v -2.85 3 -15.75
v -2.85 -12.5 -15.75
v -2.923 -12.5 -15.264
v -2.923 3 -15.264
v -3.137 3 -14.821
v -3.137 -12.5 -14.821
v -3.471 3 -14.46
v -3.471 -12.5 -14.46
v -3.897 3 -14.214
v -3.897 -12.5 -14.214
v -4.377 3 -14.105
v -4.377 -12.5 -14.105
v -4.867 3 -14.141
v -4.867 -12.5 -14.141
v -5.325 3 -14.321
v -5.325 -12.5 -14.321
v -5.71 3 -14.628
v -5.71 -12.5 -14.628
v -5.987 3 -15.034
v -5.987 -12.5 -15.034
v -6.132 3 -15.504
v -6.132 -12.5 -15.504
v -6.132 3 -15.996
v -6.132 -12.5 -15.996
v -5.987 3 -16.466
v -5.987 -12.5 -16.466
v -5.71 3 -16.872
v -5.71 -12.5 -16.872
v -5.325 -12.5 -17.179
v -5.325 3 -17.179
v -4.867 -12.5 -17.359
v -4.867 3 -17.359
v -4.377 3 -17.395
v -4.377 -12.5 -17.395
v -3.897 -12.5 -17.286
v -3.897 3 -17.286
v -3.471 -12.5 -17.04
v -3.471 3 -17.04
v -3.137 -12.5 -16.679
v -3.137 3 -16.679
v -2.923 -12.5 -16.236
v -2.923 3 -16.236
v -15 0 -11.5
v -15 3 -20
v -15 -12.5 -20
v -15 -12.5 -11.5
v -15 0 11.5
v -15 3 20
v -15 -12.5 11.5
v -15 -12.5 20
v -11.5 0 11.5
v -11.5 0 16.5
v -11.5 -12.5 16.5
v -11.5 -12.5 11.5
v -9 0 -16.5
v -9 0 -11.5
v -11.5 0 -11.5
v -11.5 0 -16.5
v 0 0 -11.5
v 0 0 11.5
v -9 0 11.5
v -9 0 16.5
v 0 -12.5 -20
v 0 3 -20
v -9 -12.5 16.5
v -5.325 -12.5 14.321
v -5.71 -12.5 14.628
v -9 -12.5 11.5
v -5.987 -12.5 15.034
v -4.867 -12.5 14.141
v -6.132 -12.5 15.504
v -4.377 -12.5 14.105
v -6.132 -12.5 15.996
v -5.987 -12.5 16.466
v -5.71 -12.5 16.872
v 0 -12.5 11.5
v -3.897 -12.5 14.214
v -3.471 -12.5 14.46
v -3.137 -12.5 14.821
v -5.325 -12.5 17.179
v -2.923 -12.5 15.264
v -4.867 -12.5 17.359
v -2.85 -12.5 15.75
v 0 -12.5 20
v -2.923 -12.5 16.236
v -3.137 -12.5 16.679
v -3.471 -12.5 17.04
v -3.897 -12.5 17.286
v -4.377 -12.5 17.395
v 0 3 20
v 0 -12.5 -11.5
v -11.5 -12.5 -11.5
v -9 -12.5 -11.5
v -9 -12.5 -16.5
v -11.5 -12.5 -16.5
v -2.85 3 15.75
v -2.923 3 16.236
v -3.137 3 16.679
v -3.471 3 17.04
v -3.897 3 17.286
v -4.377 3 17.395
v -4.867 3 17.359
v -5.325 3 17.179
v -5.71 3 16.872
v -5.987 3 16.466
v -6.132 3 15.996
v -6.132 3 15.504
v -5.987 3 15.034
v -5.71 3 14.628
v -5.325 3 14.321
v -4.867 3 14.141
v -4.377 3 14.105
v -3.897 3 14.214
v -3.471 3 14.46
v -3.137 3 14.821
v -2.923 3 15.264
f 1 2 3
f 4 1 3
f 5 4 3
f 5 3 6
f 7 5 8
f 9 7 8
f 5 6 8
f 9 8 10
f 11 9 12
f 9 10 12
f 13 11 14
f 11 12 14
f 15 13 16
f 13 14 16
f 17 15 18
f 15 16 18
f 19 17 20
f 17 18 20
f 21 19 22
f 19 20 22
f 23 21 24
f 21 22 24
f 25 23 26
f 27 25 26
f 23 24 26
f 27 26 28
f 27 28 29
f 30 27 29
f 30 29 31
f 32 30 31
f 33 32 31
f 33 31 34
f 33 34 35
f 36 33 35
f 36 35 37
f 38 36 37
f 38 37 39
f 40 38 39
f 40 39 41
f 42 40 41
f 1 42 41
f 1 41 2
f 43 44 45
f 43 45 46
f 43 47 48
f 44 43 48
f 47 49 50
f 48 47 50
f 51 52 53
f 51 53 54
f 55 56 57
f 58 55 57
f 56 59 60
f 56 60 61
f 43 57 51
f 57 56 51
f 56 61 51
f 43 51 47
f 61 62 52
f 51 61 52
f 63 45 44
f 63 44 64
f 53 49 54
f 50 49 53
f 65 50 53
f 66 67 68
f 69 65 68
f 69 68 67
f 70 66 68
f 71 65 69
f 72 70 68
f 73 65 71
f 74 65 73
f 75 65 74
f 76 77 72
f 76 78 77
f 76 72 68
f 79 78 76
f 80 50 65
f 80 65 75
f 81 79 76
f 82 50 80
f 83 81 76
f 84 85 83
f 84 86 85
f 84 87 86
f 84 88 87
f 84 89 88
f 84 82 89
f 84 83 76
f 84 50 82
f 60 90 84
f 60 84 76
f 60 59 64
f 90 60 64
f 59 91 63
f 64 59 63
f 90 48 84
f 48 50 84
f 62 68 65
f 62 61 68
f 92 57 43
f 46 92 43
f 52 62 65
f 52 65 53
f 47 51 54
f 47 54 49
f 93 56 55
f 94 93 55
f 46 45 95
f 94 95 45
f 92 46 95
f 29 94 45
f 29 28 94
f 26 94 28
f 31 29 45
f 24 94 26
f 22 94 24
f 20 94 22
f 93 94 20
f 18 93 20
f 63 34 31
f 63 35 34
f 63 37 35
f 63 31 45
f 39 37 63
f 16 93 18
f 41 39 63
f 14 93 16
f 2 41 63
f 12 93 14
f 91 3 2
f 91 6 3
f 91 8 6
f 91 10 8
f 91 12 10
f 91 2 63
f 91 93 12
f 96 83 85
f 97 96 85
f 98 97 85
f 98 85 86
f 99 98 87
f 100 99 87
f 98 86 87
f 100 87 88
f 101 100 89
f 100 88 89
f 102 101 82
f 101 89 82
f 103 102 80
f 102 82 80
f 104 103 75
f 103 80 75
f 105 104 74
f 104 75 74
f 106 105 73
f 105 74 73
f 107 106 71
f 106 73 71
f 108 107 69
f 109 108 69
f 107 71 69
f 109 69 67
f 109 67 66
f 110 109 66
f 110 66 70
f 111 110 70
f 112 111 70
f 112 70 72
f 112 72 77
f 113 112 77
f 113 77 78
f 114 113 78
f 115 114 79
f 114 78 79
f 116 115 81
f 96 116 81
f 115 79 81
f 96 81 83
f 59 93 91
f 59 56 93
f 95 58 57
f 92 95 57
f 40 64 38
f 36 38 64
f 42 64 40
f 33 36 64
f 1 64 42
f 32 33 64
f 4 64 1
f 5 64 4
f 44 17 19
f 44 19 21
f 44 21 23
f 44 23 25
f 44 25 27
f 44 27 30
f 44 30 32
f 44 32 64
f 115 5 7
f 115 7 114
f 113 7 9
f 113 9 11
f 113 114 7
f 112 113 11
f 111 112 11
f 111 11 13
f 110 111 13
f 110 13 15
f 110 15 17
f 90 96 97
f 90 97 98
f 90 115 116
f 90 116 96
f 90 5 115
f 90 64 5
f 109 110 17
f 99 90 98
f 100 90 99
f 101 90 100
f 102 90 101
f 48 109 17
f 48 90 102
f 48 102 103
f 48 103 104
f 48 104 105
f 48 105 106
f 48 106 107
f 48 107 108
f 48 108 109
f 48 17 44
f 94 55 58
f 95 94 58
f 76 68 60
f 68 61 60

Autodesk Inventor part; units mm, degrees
ref_plane "YZ Plane" through (0, 0, 0) normal (1, 0, 0) x (0, 1, 0)
ref_plane "XZ Plane" through (0, 0, 0) normal (0, 1, 0) x (-1, 0, 0)
ref_plane "XY Plane" through (0, 0, 0) normal (0, 0, 1) x (1, 0, 0)
sketch "Эскиз1" plane through (0, 0, 0) normal (0, 1, 0) x (-1, 0, 0)
  line L0 (0, 0) -> (-10.5018, 0)
  line L1 (0, 0) -> (15, 0)
  line L2 (15, 0) -> (15, -20)
  line L3 (15, -20) -> (0, -20)
  line L4 (0, -20) -> (0, 0)
  line L5 (15, 0) -> (15, 20)
  line L6 (15, 20) -> (0, 20)
  line L7 (0, 20) -> (0, 0)
  dimension "d5" = 15
  dimension "d6" = 20
extrude "Выдавливание1" add sketch "Эскиз1" along normal blind 3
sketch "Эскиз3" plane through (0, 0, 0) normal (0, -1, 0) x (1, 0, 0)
  line L0 (-15, 20) -> (0, 20) projected
  line L1 (-9, 16.5) -> (-11.5, 16.5)
  line L2 (-11.5, 16.5) -> (-11.5, 11.5)
  line L3 (-9, 11.5) -> (-9, 16.5)
  line L4 (0, 0) -> (-5.7861, 0)
  line L5 (-9, -16.5) -> (-11.5, -16.5)
  line L6 (-11.5, -16.5) -> (-11.5, -11.5)
  line L7 (-9, -11.5) -> (-9, -16.5)
  line L8 (-9, -11.5) -> (0, -11.5)
  line L9 (0, 20) -> (0, -20) projected
  line L10 (0, -20) -> (-15, -20) projected
  line L11 (0, -20) -> (-15, -20)
  line L12 (-15, -20) -> (-15, -11.5)
  line L13 (-15, -20) -> (-15, 20) projected
  line L14 (-11.5, -11.5) -> (-15, -11.5)
  line L15 (0, -11.5) -> (0, -20)
  line L16 (-11.5, 16.5) -> (-11.5, 11.5)
  line L17 (-9, 11.5) -> (-9, 16.5)
  line L18 (-9, 16.5) -> (-11.5, 16.5)
  line L19 (-9, 11.5) -> (0, 11.5)
  line L20 (0, 20) -> (-15, 20)
  line L21 (0, 20) -> (-15, 20)
  line L22 (-15, 20) -> (-15, 11.5)
  line L23 (-11.5, 11.5) -> (-15, 11.5)
  line L24 (0, 11.5) -> (0, 20)
  point P0 (-15, 11.5)
extrude "Выдавливание2" add sketch "Эскиз3" along normal blind 12.5 contours L0 L9 L19 L3 L1 L2 L23 L13 | L14 L6 L5 L7 L8 L9 L10 L12
sketch "Эскиз4" plane through (0, -12.5, 0) normal (0, -1, 0) x (1, 0, 0)
  line L0 (-15, 20) -> (0, 20) projected
  line L1 (0, 20) -> (-4.5, 20)
  circle A0 centre (-4.5, 15.75) radius 1.65
  line L2 (0, 0) -> (-4.5, 0)
  circle A1 centre (-4.5, -15.75) radius 1.65
  dimension "d18" = 3.3
extrude "Выдавливание3" cut sketch "Эскиз4" against normal through all
sketch "Эскиз5" plane through (-11.5, 0, -11.5) normal (1, 0, 0) x (0, 0, -1)
  line L0 (0, -12.5) -> (8.5, -12.5) projected
  line L1 (4.25, -12.5) -> (4.25, -6)
  line L2 (0, -6) -> (3.191, -6)
  circle A0 centre (3.191, -6) radius 1.1
  line L3 (-11.5, 0) -> (-11.5, -8.8463)
  circle A1 centre (-26.191, -6) radius 1.1
  dimension "d20" = 3.191
  dimension "d21" = 2.2
properties part number "держалка_серво_бровь_нижняя"
